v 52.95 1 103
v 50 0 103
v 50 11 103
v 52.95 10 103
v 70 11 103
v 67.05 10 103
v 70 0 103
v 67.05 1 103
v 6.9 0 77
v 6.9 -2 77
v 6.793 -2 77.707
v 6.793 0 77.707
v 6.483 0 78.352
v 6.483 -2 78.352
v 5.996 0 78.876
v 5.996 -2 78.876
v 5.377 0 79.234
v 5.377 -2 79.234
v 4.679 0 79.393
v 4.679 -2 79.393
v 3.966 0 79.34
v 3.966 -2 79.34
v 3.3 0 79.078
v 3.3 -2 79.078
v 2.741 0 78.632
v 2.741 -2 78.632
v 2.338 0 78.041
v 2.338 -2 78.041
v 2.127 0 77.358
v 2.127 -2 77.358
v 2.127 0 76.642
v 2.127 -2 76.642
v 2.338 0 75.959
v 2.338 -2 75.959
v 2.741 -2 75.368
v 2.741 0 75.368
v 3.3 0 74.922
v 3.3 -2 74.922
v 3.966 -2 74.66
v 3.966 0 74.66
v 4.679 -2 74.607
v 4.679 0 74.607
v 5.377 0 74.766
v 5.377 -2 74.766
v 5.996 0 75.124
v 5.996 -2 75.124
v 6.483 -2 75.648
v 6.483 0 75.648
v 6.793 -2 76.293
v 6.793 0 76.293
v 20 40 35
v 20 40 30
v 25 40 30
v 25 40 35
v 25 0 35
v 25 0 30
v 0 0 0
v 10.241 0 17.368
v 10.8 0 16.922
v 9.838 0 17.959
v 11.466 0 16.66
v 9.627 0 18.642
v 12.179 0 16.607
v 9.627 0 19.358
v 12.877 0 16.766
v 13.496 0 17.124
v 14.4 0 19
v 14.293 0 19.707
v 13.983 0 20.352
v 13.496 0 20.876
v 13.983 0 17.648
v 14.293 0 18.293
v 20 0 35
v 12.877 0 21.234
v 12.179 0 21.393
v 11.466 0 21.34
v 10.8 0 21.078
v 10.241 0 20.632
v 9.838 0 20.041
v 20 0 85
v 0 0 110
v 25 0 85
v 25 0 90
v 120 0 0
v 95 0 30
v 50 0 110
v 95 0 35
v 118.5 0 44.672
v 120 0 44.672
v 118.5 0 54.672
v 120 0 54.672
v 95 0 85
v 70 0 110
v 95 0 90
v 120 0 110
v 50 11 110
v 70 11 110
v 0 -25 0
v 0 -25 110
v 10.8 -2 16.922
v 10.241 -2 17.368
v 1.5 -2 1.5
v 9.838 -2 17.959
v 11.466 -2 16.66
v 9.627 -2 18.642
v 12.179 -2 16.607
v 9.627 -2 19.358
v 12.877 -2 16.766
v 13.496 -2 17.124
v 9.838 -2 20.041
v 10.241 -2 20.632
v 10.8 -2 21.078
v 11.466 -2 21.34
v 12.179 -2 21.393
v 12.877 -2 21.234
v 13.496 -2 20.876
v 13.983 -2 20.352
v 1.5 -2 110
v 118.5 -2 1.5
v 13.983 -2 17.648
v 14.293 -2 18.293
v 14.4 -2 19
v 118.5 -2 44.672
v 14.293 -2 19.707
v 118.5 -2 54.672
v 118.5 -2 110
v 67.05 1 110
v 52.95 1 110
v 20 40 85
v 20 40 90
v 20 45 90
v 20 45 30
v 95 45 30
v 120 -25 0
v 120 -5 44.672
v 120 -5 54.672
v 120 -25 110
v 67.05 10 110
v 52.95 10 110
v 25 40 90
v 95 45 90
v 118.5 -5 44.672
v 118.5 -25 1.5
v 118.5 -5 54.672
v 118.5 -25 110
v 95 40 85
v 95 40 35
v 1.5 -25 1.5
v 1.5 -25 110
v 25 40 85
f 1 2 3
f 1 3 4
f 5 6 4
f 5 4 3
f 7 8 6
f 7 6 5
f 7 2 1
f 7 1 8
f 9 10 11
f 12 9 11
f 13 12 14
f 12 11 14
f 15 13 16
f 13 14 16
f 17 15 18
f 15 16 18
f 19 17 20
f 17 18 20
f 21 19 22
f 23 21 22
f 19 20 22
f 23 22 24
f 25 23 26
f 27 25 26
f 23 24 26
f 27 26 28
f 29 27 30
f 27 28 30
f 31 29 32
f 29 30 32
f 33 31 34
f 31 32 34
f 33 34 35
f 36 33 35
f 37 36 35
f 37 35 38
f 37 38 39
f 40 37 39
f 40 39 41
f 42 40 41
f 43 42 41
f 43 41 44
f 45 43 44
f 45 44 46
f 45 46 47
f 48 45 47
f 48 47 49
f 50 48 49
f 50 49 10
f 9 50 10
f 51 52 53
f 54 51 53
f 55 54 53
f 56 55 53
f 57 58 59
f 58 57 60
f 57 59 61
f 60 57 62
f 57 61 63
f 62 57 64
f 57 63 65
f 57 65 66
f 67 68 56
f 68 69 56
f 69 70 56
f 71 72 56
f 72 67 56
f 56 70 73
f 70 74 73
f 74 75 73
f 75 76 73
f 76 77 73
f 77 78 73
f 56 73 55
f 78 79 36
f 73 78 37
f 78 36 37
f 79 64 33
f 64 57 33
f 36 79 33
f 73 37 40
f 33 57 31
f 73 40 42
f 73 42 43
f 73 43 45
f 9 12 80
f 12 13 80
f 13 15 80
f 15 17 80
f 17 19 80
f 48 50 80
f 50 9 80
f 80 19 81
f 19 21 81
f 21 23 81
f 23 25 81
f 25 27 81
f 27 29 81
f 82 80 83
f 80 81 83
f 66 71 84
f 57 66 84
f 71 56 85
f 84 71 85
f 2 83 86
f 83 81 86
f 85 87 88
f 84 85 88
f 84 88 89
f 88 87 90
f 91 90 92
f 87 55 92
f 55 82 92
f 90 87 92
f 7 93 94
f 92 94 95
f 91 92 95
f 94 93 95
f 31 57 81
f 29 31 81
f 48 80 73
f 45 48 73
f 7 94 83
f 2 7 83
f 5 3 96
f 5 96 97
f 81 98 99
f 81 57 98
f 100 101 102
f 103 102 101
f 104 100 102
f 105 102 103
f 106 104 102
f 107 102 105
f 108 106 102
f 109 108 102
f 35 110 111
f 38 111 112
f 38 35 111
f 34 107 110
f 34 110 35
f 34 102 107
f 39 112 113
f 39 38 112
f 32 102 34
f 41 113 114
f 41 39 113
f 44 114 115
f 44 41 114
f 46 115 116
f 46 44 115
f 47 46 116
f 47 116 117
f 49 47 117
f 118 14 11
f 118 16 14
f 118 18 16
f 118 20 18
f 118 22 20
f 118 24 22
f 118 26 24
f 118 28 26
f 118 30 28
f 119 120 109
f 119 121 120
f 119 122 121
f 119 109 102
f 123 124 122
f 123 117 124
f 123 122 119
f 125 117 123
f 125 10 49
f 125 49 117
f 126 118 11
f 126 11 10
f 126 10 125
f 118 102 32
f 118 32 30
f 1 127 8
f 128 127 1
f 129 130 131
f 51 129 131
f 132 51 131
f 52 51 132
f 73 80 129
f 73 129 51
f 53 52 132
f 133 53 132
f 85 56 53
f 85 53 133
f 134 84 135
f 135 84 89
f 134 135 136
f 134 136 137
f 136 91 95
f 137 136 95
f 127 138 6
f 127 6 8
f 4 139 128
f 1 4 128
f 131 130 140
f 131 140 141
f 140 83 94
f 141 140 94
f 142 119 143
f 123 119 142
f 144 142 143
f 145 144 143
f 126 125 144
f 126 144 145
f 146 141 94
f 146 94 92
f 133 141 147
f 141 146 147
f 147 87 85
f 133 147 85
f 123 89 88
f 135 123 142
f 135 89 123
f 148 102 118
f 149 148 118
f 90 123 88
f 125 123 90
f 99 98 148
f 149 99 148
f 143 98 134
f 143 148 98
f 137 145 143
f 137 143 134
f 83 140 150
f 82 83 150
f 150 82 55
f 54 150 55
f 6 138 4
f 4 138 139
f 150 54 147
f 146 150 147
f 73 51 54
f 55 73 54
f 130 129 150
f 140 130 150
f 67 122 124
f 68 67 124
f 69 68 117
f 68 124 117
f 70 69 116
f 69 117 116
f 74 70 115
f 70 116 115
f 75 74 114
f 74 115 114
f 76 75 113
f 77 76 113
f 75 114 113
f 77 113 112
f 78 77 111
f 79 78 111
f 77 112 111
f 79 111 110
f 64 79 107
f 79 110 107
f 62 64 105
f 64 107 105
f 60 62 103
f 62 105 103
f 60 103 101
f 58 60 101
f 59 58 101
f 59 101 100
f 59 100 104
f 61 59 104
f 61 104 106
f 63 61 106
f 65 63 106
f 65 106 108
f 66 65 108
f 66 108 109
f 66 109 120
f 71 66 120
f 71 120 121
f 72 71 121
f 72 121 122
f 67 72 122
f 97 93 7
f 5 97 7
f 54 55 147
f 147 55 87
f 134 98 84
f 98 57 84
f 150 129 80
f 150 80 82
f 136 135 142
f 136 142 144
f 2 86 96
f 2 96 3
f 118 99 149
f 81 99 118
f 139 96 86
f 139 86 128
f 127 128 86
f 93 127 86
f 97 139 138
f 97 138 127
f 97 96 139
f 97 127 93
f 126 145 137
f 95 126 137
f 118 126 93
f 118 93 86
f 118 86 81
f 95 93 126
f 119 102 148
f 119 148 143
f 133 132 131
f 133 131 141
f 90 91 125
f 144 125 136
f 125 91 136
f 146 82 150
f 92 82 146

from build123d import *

# Parameters (mm, degrees)
SKETCH_W        = 120
SKETCH_H        = 110
PAD_DEPTH       = 2
SKETCH001_R     = 2.4
POCKET_DEPTH    = 5
SKETCH002_W     = 1.5
SKETCH002_H     = 110
SKETCH002_W_2   = 118.5
SKETCH002_H_2   = 1.5
SKETCH002_H_3   = 108.5
PAD001_DEPTH    = 23
SKETCH003_W     = 10
SKETCH003_H     = 5
POCKET001_DEPTH = 1.5
SKETCH004_W     = 70
SKETCH004_H     = 5
SKETCH004_W_2   = 5
SKETCH004_H_2   = 50
PAD002_DEPTH    = 40
SKETCH005_W     = 75
SKETCH005_H     = 60
PAD003_DEPTH    = 5
SKETCH006_W     = 20
SKETCH006_H     = 7
PAD004_DEPTH    = 11
SKETCH007_W     = 14.1
SKETCH007_H     = 9
POCKET002_DEPTH = 10


with BuildPart() as part:
    # Sketch → Pad (new body)
    with BuildSketch(Plane.XZ):
        with Locations((60, 55)):
            Rectangle(SKETCH_W, SKETCH_H)
    extrude(amount=PAD_DEPTH)

    # Sketch001 (on Face6 of Pad) → Pocket (cut)
    with BuildSketch(Plane.XZ.offset(2)):
        with Locations((12, 19)):
            Circle(SKETCH001_R)
        with Locations((4.5, 77)):
            Circle(SKETCH001_R)
    extrude(amount=-POCKET_DEPTH, mode=Mode.SUBTRACT)

    # Sketch002 (on Face5 of Pocket) → Pad001 (join)
    with BuildSketch(Plane.XZ.offset(2)):
        with Locations((0.75, 55)):
            Rectangle(SKETCH002_W, SKETCH002_H)
        with Locations((60.75, 0.75)):
            Rectangle(SKETCH002_W_2, SKETCH002_H_2)
        with Locations((119.25, 55.75)):
            Rectangle(SKETCH002_W, SKETCH002_H_3)
    extrude(amount=PAD001_DEPTH)

    # Sketch003 (on Face11 of Pad001) → Pocket001 (cut)
    with BuildSketch(Plane(origin=(120, 0, 0), x_dir=(0, 0, 1), z_dir=(1, 0, 0))):
        with Locations((49.672382, 2.5)):
            Rectangle(SKETCH003_W, SKETCH003_H)
    extrude(amount=-POCKET001_DEPTH, mode=Mode.SUBTRACT)

    # Sketch004 (on Face1 of Pocket001) → Pad002 (join)
    with BuildSketch(Plane(origin=(0, 0, 0), x_dir=(1, 0, 0), z_dir=(0, 1, 0))):
        with Locations((60, -32.5)):
            Rectangle(SKETCH004_W, SKETCH004_H)
        with Locations((22.5, -60)):
            Rectangle(SKETCH004_W_2, SKETCH004_H_2)
        with Locations((60, -87.5)):
            Rectangle(SKETCH004_W, SKETCH004_H)
    extrude(amount=PAD002_DEPTH)

    # Sketch005 (on Face30 of Pad002) → Pad003 (join)
    with BuildSketch(Plane(origin=(0, 40, 0), x_dir=(1, 0, 0), z_dir=(0, 1, 0))):
        with Locations((57.5, -60)):
            Rectangle(SKETCH005_W, SKETCH005_H)
    extrude(amount=PAD003_DEPTH)

    # Sketch006 (on Face1 of Pad003) → Pad004 (join)
    with BuildSketch(Plane(origin=(0, 0, 0), x_dir=(1, 0, 0), z_dir=(0, 1, 0))):
        with Locations((60, -106.5)):
            Rectangle(SKETCH006_W, SKETCH006_H)
    extrude(amount=PAD004_DEPTH)

    # Sketch007 (on Face35 of Pad004) → Pocket002 (cut)
    with BuildSketch(Plane(origin=(0, 0, 110), x_dir=(-1, 0, 0), z_dir=(0, 0, 1))):
        with Locations((-60, -5.5)):
            Rectangle(SKETCH007_W, SKETCH007_H)
    extrude(amount=-POCKET002_DEPTH, mode=Mode.SUBTRACT)


solid = part.part
